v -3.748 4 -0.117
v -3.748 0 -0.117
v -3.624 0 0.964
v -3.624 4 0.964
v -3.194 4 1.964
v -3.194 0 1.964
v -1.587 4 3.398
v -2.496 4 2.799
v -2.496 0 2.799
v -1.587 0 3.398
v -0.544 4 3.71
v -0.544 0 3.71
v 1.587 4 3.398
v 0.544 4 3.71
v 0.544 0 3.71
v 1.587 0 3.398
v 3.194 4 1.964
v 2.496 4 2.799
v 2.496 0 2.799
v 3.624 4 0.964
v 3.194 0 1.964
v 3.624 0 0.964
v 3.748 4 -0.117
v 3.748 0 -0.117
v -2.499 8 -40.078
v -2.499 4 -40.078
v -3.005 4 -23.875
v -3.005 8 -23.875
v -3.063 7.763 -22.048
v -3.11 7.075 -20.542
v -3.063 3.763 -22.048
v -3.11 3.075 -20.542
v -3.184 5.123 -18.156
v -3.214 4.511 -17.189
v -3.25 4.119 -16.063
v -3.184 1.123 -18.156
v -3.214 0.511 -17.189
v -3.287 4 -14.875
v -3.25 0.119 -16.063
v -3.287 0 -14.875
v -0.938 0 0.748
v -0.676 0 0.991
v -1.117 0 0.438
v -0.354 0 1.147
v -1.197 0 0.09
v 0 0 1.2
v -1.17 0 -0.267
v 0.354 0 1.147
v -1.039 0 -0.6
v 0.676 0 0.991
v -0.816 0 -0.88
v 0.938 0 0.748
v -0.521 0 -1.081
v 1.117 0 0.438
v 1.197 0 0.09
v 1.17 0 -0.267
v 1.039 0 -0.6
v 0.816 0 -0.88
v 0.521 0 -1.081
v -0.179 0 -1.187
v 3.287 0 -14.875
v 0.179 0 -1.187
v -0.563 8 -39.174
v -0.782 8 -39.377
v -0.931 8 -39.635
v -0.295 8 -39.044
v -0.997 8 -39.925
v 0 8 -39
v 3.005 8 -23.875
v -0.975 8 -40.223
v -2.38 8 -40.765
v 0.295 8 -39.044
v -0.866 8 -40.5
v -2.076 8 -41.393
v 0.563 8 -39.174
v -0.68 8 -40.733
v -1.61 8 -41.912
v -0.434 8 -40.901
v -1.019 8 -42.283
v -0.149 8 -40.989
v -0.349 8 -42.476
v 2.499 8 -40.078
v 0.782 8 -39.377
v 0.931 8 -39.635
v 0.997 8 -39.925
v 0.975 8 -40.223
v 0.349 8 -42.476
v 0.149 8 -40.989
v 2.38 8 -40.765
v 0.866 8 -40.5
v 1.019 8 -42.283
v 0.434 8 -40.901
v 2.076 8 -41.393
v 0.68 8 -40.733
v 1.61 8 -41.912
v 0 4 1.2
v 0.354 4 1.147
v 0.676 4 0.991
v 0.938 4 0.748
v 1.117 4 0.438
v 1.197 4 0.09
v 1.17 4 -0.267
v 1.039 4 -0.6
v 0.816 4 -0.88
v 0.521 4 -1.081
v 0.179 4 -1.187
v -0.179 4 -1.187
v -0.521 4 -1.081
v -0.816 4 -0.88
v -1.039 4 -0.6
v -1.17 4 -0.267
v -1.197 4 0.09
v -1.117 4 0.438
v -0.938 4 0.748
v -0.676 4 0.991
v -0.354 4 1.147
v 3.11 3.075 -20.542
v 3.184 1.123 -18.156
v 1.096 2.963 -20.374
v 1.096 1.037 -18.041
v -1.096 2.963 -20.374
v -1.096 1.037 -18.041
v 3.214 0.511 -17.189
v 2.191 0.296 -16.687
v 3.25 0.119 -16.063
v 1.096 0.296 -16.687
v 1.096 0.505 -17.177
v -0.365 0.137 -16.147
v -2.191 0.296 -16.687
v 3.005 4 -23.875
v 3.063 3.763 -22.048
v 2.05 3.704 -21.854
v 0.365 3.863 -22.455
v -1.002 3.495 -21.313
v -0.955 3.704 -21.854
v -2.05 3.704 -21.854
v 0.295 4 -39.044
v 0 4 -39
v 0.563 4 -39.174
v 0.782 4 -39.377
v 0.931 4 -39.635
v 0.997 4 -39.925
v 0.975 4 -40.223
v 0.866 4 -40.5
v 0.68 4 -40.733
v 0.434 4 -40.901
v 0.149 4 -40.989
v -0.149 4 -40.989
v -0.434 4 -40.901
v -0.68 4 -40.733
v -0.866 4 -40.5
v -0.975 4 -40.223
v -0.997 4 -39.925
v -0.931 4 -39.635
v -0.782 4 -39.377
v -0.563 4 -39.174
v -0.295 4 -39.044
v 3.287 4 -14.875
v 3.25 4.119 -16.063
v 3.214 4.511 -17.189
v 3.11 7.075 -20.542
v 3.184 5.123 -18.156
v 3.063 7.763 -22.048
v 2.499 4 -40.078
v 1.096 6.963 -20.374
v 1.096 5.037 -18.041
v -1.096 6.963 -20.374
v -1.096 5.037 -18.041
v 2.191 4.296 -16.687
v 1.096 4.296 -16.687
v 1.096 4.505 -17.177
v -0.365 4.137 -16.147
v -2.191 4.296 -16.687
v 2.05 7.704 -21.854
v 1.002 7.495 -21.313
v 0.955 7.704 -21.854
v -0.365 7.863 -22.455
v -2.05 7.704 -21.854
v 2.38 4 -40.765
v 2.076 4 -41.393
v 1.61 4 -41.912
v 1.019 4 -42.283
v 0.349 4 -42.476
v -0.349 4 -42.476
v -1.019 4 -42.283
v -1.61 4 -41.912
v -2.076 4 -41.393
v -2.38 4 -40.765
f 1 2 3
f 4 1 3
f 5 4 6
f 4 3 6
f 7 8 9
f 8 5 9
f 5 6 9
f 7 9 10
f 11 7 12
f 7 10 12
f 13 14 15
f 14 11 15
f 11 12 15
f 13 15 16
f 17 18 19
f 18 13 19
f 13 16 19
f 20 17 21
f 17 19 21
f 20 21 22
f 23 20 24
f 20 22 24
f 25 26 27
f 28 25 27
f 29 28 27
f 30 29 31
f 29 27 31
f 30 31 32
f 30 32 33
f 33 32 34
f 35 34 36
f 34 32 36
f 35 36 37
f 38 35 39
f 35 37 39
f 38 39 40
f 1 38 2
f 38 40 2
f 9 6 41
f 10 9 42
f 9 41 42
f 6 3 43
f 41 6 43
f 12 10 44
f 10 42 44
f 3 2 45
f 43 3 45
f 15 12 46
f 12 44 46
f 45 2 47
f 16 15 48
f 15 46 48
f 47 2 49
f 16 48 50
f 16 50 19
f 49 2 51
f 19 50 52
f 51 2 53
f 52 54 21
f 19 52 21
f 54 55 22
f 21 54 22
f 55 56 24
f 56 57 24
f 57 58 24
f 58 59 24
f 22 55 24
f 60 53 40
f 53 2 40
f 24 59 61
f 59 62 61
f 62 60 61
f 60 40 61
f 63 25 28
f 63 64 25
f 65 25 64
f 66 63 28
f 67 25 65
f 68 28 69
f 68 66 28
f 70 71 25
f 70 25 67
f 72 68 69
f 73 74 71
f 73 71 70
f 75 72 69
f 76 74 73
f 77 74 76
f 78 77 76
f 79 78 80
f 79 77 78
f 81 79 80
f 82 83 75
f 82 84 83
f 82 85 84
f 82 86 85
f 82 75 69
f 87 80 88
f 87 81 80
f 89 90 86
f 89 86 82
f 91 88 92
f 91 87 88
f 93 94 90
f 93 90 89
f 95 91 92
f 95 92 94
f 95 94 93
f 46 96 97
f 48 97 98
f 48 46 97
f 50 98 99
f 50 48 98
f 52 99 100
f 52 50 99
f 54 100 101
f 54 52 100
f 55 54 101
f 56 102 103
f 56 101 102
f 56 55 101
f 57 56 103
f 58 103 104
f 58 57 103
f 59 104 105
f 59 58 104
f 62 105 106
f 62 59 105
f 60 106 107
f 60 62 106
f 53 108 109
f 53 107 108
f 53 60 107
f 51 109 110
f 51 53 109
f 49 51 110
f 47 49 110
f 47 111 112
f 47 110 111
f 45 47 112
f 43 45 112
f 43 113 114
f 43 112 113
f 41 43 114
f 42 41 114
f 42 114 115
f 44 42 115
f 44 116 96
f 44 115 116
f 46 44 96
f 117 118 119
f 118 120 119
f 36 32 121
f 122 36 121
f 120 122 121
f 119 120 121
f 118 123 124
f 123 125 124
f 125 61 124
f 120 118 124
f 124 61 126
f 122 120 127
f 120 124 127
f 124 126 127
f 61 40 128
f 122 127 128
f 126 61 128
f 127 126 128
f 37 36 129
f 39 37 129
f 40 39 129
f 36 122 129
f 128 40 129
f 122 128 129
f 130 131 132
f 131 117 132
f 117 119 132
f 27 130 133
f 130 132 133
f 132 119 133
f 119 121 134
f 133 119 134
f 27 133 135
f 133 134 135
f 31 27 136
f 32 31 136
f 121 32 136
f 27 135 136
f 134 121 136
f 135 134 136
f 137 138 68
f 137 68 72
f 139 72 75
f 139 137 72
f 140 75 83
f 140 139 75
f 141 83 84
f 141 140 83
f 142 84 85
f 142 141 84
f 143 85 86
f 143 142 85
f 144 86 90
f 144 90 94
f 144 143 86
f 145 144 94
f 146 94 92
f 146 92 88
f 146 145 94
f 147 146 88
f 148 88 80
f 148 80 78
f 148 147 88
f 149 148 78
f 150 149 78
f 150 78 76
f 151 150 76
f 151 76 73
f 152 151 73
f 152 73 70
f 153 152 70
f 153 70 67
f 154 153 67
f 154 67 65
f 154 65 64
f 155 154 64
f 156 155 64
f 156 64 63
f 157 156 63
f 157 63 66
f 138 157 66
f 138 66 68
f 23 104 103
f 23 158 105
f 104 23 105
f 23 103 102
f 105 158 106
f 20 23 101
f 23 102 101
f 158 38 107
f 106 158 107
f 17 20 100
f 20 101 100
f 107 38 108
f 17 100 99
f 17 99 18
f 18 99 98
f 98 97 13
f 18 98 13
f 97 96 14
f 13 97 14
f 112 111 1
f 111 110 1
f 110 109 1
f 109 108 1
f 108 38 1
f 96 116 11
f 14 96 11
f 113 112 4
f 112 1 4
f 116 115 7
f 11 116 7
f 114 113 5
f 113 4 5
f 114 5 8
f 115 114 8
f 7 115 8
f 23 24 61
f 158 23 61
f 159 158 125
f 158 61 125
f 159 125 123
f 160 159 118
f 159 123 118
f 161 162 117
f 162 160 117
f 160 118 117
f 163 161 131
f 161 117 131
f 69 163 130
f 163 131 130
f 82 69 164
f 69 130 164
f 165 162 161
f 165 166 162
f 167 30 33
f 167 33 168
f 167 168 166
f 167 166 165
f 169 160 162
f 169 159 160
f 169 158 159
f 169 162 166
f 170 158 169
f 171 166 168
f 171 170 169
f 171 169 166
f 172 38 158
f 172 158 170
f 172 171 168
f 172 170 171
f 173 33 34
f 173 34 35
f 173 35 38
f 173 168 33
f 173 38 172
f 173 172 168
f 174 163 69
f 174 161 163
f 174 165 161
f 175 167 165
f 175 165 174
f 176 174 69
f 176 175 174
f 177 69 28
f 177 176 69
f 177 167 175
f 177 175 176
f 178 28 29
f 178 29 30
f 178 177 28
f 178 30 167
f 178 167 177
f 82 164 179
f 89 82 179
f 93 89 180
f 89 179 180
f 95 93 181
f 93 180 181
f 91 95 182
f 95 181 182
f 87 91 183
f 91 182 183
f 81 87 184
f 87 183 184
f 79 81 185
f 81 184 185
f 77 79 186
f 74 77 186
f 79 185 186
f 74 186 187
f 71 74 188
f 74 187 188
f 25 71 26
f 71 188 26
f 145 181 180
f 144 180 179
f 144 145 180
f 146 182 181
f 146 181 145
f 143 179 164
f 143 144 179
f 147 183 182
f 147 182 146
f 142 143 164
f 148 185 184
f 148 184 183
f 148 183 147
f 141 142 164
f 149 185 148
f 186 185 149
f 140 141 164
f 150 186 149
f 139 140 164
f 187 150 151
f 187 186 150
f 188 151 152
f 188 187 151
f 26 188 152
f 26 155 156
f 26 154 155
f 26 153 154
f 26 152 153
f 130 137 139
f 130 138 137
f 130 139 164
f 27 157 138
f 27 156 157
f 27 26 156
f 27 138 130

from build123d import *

# Parameters (mm, degrees)
SKETCH1_R               = 1.2
SKETCH1_R_2             = 1
BOSS_EXTRUDE1_DEPTH     = 8
CUT_EXTRUDE7_DEPTH      = 44.408668489
CUT_EXTRUDE7_DEPTH_BACK = 44.408668489


with BuildPart() as part:
    # Sketch1 → Boss-Extrude1 (new body)
    with BuildSketch(Plane(origin=(0, 0, 0), x_dir=(1, 0, 0), z_dir=(0, 1, 0))):
        with BuildLine():
            Line((3.748168498, 0.1171875), (2.498778999, 40.078125))
            ThreePointArc((2.498778999, 40.078125), (0, 42.5), (-2.498778999, 40.078125))
            Line((-2.498778999, 40.078125), (-3.748168498, 0.1171875))
            ThreePointArc((-3.748168498, 0.1171875), (0, -3.75), (3.748168498, 0.1171875))
        make_face()
        Circle(SKETCH1_R, mode=Mode.SUBTRACT)
        with Locations((0, 40)):
            Circle(SKETCH1_R_2, mode=Mode.SUBTRACT)
    extrude(amount=BOSS_EXTRUDE1_DEPTH)

    # Sketch4 → Cut-Extrude7 (cut, two sides: drawn at the far end of the back side and taken through both)
    with BuildSketch(Plane(origin=(0, 0, 0), x_dir=(0, 0, -1), z_dir=(1, 0, 0)).offset(-CUT_EXTRUDE7_DEPTH_BACK)):
        with BuildLine():
            Line((42.5, 4), (23.875, 4))
            add(Edge.make_bspline(
                [(14.875, 0), (19.125, 0), (19.123406576, 3.999999238), (23.875, 4)],
                knots=[0, 0, 0, 0, 1, 1, 1, 1], degree=3))
            ThreePointArc((14.875, 0), (31.025432495, -14.146346291), (42.5, 4))
        make_face()
        with BuildLine():
            Line((14.875, 4), (-3.75, 4))
            ThreePointArc((-3.75, 4), (8.0625, 19.8125), (23.875, 8))
            add(Edge.make_bspline(
                [(14.875, 4), (19.125, 4), (19.123406576, 7.999999238), (23.875, 8)],
                knots=[0, 0, 0, 0, 1, 1, 1, 1], degree=3))
        make_face()
    extrude(amount=CUT_EXTRUDE7_DEPTH + CUT_EXTRUDE7_DEPTH_BACK, mode=Mode.SUBTRACT)


solid = part.part
